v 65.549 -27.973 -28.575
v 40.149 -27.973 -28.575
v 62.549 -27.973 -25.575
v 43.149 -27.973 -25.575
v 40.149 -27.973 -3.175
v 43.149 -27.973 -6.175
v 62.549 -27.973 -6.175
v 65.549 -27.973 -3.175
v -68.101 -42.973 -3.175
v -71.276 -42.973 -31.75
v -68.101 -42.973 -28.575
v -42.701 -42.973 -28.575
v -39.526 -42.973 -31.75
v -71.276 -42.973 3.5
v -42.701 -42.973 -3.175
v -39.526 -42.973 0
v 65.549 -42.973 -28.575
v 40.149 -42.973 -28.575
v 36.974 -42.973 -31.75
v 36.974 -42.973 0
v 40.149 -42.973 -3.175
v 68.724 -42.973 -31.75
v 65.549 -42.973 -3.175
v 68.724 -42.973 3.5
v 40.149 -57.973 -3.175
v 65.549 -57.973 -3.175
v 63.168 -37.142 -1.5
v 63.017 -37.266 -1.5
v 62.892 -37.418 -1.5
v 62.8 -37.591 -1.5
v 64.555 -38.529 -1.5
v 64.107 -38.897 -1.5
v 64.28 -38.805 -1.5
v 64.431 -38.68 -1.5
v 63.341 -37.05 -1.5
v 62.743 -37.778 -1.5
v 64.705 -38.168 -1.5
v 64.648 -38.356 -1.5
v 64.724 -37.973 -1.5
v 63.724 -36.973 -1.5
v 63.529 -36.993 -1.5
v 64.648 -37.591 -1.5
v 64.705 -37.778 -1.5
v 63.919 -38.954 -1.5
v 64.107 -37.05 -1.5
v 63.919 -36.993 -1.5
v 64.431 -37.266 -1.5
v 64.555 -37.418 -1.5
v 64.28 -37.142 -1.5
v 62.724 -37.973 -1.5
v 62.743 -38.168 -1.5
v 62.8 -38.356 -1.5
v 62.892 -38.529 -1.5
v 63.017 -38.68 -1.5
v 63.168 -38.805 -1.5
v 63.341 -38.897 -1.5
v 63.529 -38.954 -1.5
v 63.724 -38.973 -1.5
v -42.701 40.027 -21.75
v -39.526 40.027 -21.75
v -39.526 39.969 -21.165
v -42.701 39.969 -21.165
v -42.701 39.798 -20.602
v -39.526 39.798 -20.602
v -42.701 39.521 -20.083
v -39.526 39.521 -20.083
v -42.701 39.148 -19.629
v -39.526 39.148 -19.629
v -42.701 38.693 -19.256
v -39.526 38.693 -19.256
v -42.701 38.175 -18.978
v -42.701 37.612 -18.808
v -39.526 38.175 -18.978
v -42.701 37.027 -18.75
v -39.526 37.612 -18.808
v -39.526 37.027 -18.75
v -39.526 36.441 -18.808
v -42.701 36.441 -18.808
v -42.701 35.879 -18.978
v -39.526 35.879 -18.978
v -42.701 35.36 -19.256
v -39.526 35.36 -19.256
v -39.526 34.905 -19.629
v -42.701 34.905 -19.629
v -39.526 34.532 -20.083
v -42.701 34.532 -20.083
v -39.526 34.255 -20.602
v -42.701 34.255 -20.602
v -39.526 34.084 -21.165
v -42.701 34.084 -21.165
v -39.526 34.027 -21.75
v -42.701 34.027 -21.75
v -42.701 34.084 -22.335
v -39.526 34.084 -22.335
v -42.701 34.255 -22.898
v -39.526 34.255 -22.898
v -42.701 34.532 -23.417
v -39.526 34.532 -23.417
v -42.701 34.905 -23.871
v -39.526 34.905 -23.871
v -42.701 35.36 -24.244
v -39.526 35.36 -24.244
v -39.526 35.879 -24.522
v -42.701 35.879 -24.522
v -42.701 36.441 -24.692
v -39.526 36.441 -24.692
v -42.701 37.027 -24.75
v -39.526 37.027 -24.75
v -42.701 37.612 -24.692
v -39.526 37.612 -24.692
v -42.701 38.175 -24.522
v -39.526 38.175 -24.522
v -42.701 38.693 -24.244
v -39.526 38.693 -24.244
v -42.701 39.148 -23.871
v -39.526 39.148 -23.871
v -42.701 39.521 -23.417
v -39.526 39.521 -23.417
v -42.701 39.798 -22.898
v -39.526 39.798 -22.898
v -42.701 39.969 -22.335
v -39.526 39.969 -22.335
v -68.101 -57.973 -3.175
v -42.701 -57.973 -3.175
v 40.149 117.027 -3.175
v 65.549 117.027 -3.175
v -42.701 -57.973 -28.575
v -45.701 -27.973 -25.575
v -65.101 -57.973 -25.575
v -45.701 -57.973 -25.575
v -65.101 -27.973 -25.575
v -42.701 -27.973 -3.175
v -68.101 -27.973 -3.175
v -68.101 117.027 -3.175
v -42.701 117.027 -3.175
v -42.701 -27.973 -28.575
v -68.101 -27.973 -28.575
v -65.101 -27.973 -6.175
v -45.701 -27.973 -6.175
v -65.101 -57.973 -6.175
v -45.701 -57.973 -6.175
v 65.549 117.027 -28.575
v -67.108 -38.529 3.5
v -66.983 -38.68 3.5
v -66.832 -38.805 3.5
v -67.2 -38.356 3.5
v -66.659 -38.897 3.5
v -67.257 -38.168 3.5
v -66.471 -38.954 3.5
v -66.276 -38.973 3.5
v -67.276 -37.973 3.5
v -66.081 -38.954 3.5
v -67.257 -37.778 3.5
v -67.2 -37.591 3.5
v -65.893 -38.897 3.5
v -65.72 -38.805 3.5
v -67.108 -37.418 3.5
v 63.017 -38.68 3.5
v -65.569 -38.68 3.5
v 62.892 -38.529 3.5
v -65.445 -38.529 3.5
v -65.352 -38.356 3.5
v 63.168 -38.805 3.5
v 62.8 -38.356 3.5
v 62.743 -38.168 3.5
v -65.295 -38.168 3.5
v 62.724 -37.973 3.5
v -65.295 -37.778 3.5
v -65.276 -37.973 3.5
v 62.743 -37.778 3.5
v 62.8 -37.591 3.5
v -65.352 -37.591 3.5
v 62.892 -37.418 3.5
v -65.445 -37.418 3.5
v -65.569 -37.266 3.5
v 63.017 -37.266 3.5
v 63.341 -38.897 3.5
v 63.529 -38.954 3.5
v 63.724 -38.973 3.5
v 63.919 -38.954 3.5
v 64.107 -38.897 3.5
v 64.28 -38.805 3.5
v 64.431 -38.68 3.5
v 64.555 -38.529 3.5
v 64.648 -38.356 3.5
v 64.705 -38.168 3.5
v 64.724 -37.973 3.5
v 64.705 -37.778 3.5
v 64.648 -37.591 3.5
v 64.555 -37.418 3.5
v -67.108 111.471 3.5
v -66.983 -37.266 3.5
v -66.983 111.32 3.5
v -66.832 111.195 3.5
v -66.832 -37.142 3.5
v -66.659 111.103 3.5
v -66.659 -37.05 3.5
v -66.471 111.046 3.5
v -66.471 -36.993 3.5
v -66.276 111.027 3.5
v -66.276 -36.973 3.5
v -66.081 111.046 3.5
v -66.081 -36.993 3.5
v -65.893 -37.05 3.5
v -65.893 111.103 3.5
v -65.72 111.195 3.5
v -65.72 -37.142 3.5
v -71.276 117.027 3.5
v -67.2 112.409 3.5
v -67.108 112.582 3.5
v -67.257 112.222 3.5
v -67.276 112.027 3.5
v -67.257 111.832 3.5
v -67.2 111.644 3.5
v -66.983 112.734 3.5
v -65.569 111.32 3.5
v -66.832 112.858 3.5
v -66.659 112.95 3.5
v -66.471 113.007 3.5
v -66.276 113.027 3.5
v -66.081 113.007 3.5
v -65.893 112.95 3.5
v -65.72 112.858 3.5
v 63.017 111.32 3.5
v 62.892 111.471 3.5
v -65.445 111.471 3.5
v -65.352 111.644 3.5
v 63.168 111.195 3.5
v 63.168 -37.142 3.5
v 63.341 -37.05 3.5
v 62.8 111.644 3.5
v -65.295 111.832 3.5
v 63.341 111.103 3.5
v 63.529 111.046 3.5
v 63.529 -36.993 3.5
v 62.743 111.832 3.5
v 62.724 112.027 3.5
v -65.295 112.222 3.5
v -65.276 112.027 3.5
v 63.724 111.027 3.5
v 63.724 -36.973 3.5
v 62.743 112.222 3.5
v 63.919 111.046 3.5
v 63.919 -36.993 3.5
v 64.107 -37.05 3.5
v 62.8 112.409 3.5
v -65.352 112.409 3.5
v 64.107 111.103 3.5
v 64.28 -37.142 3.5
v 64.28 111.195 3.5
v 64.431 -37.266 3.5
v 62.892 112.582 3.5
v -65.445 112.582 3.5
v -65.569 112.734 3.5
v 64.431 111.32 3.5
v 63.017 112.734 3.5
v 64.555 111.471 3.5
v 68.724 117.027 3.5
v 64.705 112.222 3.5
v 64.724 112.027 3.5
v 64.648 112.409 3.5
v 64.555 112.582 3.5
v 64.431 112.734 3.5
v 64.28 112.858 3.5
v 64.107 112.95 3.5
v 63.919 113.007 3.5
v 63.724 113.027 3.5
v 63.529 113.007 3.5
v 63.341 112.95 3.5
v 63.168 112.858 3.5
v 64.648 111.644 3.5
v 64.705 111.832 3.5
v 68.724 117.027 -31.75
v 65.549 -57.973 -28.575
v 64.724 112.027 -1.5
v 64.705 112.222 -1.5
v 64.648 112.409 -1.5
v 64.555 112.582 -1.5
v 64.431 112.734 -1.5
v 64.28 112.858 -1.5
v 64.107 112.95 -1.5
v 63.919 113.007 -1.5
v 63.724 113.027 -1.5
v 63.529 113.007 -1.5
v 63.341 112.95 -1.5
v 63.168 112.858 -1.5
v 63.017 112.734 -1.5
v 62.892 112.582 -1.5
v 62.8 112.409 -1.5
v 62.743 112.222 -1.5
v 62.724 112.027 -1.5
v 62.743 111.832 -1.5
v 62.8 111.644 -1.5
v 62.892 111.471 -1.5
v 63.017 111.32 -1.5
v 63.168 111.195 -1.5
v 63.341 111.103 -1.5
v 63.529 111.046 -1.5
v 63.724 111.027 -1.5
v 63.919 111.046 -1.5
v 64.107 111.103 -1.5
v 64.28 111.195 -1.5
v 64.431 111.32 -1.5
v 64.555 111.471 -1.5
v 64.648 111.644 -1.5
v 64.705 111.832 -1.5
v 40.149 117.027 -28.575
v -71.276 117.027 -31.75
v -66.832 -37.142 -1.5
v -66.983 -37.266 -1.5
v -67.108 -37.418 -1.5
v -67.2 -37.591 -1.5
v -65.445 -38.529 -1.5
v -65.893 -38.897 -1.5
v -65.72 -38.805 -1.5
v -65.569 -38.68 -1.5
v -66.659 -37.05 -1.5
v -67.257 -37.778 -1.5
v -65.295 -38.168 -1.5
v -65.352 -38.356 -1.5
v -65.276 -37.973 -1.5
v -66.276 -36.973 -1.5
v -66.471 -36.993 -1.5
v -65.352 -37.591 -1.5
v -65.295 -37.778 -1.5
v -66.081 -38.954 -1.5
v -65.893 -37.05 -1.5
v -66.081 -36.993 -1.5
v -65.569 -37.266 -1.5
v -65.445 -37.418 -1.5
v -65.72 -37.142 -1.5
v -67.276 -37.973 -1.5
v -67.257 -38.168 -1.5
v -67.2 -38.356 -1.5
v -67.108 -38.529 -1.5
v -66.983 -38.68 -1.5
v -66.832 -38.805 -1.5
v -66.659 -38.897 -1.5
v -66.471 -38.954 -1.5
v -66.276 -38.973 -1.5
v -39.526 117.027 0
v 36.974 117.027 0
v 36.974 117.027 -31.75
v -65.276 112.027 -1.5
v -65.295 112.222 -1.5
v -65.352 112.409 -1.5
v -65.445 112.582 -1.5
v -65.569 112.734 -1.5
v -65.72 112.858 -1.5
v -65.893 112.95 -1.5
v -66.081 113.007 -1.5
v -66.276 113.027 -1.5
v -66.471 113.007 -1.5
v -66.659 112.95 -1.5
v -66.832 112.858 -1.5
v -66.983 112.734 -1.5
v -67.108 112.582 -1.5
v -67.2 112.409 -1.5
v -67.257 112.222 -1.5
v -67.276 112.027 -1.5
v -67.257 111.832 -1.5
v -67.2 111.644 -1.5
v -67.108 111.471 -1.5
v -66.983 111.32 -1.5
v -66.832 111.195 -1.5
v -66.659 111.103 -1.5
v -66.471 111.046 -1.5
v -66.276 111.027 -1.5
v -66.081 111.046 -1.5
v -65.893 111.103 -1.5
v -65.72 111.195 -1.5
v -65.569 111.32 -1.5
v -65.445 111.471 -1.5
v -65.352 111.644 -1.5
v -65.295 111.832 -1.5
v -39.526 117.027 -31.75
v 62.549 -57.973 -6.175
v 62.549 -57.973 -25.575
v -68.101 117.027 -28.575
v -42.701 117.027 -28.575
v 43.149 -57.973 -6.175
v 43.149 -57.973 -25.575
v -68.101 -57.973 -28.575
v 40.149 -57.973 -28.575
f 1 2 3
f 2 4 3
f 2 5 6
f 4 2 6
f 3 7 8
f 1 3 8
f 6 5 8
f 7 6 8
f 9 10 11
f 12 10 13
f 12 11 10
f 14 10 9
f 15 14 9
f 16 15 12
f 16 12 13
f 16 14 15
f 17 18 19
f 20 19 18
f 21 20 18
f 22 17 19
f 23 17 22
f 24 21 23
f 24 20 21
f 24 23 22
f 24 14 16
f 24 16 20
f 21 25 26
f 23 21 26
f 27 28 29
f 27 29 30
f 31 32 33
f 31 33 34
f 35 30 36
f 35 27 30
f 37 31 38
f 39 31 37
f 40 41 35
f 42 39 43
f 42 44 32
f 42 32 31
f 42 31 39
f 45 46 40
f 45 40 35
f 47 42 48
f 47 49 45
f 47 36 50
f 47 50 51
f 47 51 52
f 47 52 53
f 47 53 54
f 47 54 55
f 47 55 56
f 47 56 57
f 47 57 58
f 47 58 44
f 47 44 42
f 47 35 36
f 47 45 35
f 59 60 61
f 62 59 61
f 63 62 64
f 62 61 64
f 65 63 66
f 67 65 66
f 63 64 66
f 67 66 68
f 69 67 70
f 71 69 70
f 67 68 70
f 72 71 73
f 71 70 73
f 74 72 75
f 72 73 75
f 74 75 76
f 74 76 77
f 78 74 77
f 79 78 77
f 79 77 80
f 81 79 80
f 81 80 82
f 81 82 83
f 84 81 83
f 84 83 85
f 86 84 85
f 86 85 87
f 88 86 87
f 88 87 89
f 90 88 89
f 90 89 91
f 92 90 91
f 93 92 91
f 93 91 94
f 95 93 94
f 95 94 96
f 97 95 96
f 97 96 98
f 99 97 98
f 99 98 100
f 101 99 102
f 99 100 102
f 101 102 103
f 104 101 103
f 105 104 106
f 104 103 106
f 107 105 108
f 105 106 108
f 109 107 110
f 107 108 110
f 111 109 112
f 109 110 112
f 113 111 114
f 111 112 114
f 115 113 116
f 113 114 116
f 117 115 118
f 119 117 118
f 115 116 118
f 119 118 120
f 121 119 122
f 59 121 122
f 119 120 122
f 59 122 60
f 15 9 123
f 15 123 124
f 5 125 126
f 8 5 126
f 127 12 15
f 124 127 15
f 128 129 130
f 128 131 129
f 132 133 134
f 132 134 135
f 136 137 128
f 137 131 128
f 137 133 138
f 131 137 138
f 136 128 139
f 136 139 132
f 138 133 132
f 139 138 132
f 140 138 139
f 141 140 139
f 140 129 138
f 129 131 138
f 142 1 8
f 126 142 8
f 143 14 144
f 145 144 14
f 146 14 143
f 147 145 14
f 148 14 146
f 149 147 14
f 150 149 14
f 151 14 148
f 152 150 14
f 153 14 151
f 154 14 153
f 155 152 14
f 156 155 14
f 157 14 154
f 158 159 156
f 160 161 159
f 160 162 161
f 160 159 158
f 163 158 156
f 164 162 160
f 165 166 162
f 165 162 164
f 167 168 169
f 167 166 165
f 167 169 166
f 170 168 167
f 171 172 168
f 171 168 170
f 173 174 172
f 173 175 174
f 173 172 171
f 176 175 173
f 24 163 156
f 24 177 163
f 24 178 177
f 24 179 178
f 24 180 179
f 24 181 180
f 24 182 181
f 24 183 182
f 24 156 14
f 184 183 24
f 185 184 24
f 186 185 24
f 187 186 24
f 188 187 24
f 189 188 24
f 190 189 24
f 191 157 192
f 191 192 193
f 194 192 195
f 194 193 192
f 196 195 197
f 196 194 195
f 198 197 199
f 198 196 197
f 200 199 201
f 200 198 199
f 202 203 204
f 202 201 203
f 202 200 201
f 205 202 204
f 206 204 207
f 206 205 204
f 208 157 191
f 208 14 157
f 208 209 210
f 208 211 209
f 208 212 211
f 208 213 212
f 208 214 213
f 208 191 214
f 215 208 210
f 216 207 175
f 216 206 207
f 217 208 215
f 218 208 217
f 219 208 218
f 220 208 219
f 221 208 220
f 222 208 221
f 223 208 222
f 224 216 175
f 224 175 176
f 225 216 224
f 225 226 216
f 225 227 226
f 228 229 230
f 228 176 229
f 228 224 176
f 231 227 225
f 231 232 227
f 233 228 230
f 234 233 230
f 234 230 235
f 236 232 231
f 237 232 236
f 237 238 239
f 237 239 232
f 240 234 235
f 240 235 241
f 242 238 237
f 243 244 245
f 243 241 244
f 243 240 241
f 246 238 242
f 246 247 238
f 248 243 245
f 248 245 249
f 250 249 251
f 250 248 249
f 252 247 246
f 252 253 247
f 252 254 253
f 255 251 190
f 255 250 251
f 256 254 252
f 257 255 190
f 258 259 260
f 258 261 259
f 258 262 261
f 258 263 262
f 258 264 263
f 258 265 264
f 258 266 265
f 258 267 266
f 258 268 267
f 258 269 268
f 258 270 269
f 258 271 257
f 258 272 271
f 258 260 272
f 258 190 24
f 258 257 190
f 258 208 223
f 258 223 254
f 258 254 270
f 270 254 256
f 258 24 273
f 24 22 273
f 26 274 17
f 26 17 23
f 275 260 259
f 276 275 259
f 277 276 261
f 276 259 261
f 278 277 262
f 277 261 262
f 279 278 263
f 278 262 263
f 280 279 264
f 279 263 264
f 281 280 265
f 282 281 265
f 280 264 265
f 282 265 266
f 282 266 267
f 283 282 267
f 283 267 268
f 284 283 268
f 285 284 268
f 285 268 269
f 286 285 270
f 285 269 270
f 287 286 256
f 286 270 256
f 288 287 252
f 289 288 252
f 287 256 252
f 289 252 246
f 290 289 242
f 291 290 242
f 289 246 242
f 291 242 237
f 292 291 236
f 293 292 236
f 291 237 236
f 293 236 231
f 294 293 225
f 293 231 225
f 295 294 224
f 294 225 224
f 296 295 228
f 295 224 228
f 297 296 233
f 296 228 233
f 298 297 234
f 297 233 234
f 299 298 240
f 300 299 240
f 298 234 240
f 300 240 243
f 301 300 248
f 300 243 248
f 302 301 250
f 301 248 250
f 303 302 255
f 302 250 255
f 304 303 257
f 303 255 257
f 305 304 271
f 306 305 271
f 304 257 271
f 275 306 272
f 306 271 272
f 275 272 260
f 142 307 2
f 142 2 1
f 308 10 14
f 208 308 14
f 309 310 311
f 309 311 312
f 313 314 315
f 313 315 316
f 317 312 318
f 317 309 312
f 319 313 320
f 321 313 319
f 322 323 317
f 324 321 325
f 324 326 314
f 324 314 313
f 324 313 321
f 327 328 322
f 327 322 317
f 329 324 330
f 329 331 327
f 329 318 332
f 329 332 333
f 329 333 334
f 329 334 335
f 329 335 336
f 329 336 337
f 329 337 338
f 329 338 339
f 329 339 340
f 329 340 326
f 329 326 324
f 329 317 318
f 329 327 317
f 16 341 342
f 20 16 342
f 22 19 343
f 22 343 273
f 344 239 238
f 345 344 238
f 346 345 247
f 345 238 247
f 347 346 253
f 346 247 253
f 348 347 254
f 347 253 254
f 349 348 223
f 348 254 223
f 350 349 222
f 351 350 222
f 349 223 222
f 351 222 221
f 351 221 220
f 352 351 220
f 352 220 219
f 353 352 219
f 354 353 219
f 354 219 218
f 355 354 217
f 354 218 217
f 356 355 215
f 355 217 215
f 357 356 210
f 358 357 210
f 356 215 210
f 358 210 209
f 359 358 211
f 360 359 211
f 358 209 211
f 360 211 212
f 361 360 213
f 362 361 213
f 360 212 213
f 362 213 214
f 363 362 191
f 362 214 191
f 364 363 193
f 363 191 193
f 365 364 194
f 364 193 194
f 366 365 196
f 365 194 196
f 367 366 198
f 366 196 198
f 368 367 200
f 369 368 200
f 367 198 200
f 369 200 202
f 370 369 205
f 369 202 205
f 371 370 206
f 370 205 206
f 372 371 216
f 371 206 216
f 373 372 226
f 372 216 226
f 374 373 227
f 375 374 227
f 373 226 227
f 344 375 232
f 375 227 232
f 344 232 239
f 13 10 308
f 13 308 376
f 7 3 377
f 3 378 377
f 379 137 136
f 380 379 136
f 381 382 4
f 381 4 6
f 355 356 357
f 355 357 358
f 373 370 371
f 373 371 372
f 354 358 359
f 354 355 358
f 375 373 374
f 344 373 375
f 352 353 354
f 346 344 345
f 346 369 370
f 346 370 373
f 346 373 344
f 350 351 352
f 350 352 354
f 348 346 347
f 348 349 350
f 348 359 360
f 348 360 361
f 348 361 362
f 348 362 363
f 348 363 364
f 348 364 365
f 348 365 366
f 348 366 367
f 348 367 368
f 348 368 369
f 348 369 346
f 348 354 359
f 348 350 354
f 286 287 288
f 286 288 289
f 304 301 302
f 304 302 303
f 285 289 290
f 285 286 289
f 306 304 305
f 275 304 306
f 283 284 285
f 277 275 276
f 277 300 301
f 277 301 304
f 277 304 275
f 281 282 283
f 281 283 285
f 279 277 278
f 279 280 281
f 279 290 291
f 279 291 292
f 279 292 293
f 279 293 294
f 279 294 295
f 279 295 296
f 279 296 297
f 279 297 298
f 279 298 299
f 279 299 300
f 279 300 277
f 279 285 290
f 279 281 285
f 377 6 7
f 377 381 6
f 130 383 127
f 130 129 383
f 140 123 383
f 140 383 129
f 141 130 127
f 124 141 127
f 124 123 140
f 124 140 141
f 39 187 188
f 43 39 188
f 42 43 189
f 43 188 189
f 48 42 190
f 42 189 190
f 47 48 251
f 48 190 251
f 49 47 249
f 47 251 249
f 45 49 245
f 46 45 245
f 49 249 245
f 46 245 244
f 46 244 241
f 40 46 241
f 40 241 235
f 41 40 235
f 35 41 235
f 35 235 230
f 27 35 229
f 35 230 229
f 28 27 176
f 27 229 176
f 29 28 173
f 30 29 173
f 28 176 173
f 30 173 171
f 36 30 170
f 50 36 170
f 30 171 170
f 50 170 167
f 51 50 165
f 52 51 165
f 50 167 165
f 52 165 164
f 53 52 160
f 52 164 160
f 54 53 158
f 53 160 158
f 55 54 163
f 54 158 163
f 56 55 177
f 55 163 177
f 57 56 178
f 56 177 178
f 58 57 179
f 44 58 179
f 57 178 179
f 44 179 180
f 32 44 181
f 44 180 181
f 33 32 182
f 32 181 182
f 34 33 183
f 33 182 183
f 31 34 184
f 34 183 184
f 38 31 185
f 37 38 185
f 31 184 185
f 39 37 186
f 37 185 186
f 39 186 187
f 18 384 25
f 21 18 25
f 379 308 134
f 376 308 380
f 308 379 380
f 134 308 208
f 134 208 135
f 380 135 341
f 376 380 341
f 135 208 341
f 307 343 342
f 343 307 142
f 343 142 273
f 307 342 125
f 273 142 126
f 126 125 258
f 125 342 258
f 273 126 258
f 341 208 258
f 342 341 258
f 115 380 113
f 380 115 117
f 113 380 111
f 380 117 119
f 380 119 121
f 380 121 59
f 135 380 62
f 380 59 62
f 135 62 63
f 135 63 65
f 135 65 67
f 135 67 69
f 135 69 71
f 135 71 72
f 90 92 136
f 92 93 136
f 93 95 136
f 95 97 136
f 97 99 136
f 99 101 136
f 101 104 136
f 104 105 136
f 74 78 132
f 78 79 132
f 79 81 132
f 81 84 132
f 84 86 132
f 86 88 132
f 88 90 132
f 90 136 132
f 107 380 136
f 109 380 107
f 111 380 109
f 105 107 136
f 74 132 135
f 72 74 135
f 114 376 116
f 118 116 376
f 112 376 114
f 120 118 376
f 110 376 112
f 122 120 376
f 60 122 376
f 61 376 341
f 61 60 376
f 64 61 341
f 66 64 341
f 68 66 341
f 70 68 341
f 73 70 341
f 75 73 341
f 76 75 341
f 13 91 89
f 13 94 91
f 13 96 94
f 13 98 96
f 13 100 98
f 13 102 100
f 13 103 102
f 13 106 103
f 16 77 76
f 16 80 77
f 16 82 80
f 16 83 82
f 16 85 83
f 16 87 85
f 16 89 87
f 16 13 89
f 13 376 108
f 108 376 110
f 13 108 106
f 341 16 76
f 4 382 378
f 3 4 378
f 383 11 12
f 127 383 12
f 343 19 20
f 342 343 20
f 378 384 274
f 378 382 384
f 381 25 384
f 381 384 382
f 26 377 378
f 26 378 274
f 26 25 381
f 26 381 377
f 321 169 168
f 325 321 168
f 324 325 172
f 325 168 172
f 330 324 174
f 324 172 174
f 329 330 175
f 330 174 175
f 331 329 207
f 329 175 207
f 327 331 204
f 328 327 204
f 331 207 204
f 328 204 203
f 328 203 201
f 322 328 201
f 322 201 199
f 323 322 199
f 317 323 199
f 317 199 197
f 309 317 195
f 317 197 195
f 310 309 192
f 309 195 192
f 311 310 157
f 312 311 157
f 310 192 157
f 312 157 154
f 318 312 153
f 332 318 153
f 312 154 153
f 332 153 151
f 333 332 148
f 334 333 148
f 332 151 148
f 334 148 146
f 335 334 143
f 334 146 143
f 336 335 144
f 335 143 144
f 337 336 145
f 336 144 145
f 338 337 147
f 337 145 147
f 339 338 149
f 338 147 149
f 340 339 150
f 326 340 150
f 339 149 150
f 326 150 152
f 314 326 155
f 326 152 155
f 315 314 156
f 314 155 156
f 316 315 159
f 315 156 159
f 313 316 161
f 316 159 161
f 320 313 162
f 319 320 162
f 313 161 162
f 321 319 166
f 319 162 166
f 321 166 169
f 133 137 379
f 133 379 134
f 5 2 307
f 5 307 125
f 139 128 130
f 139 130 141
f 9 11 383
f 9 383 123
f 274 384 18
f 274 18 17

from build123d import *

# Parameters (mm, degrees)
F0_W     = 140
F0_H     = 160
F1_DEPTH = 3.5
F2_W     = 31.75
F2_H     = 31.75
F2_W_2   = 25.4
F2_H_2   = 25.4
F3_DEPTH = 160
F4_W     = 25.4
F4_H     = 25.4
F4_W_2   = 19.4
F4_H_2   = 19.4
F5_DEPTH = 15
F6_R     = 3
F7_DEPTH = 4
F8_R     = 1
F9_DEPTH = 5


with BuildPart() as f1:
    # F0 (on Top) → F1 (new body)
    with BuildSketch(Plane.XY):
        with Locations((-1.276044, 37.026612)):
            Rectangle(F0_W, F0_H)
    extrude(amount=F1_DEPTH)

    # F2 (on face) → F3 (join)
    with BuildSketch(Plane.XZ.offset(42.973388)):
        with Locations((-55.401044, -15.875)):
            Rectangle(F2_W, F2_H)
        with Locations((-55.401044, -15.875)):
            Rectangle(F2_W_2, F2_H_2, mode=Mode.SUBTRACT)
        with Locations((52.848956, -15.875)):
            Rectangle(F2_W, F2_H)
        with Locations((52.848956, -15.875)):
            Rectangle(F2_W_2, F2_H_2, mode=Mode.SUBTRACT)
    extrude(amount=-F3_DEPTH)

    # F4 (on face) → F5 (join, symmetric)
    with BuildSketch(Plane.XZ.offset(42.973388)):
        with Locations((-55.401044, -15.875)):
            Rectangle(F4_W, F4_H)
        with Locations((-55.401044, -15.875)):
            Rectangle(F4_W_2, F4_H_2, mode=Mode.SUBTRACT)
        with Locations((52.848956, -15.875)):
            Rectangle(F4_W, F4_H)
        with Locations((52.848956, -15.875)):
            Rectangle(F4_W_2, F4_H_2, mode=Mode.SUBTRACT)
    extrude(amount=F5_DEPTH, both=True)

    # F6 (on face) → F7 (cut)
    with BuildSketch(Plane.YZ.offset(-39.526044)):
        with Locations((37.026612, -21.75)):
            Circle(F6_R)
    extrude(amount=-F7_DEPTH, mode=Mode.SUBTRACT)

    # F8 (on face) → F9 (cut)
    with BuildSketch(Plane.XY.offset(3.5)):
        with Locations((-66.276044, 112.026612)):
            Circle(F8_R)
        with Locations((63.723956, 112.026612)):
            Circle(F8_R)
        with Locations((63.723956, -37.973388)):
            Circle(F8_R)
        with Locations((-66.276044, -37.973388)):
            Circle(F8_R)
    extrude(amount=-F9_DEPTH, mode=Mode.SUBTRACT)


solid = f1.part
